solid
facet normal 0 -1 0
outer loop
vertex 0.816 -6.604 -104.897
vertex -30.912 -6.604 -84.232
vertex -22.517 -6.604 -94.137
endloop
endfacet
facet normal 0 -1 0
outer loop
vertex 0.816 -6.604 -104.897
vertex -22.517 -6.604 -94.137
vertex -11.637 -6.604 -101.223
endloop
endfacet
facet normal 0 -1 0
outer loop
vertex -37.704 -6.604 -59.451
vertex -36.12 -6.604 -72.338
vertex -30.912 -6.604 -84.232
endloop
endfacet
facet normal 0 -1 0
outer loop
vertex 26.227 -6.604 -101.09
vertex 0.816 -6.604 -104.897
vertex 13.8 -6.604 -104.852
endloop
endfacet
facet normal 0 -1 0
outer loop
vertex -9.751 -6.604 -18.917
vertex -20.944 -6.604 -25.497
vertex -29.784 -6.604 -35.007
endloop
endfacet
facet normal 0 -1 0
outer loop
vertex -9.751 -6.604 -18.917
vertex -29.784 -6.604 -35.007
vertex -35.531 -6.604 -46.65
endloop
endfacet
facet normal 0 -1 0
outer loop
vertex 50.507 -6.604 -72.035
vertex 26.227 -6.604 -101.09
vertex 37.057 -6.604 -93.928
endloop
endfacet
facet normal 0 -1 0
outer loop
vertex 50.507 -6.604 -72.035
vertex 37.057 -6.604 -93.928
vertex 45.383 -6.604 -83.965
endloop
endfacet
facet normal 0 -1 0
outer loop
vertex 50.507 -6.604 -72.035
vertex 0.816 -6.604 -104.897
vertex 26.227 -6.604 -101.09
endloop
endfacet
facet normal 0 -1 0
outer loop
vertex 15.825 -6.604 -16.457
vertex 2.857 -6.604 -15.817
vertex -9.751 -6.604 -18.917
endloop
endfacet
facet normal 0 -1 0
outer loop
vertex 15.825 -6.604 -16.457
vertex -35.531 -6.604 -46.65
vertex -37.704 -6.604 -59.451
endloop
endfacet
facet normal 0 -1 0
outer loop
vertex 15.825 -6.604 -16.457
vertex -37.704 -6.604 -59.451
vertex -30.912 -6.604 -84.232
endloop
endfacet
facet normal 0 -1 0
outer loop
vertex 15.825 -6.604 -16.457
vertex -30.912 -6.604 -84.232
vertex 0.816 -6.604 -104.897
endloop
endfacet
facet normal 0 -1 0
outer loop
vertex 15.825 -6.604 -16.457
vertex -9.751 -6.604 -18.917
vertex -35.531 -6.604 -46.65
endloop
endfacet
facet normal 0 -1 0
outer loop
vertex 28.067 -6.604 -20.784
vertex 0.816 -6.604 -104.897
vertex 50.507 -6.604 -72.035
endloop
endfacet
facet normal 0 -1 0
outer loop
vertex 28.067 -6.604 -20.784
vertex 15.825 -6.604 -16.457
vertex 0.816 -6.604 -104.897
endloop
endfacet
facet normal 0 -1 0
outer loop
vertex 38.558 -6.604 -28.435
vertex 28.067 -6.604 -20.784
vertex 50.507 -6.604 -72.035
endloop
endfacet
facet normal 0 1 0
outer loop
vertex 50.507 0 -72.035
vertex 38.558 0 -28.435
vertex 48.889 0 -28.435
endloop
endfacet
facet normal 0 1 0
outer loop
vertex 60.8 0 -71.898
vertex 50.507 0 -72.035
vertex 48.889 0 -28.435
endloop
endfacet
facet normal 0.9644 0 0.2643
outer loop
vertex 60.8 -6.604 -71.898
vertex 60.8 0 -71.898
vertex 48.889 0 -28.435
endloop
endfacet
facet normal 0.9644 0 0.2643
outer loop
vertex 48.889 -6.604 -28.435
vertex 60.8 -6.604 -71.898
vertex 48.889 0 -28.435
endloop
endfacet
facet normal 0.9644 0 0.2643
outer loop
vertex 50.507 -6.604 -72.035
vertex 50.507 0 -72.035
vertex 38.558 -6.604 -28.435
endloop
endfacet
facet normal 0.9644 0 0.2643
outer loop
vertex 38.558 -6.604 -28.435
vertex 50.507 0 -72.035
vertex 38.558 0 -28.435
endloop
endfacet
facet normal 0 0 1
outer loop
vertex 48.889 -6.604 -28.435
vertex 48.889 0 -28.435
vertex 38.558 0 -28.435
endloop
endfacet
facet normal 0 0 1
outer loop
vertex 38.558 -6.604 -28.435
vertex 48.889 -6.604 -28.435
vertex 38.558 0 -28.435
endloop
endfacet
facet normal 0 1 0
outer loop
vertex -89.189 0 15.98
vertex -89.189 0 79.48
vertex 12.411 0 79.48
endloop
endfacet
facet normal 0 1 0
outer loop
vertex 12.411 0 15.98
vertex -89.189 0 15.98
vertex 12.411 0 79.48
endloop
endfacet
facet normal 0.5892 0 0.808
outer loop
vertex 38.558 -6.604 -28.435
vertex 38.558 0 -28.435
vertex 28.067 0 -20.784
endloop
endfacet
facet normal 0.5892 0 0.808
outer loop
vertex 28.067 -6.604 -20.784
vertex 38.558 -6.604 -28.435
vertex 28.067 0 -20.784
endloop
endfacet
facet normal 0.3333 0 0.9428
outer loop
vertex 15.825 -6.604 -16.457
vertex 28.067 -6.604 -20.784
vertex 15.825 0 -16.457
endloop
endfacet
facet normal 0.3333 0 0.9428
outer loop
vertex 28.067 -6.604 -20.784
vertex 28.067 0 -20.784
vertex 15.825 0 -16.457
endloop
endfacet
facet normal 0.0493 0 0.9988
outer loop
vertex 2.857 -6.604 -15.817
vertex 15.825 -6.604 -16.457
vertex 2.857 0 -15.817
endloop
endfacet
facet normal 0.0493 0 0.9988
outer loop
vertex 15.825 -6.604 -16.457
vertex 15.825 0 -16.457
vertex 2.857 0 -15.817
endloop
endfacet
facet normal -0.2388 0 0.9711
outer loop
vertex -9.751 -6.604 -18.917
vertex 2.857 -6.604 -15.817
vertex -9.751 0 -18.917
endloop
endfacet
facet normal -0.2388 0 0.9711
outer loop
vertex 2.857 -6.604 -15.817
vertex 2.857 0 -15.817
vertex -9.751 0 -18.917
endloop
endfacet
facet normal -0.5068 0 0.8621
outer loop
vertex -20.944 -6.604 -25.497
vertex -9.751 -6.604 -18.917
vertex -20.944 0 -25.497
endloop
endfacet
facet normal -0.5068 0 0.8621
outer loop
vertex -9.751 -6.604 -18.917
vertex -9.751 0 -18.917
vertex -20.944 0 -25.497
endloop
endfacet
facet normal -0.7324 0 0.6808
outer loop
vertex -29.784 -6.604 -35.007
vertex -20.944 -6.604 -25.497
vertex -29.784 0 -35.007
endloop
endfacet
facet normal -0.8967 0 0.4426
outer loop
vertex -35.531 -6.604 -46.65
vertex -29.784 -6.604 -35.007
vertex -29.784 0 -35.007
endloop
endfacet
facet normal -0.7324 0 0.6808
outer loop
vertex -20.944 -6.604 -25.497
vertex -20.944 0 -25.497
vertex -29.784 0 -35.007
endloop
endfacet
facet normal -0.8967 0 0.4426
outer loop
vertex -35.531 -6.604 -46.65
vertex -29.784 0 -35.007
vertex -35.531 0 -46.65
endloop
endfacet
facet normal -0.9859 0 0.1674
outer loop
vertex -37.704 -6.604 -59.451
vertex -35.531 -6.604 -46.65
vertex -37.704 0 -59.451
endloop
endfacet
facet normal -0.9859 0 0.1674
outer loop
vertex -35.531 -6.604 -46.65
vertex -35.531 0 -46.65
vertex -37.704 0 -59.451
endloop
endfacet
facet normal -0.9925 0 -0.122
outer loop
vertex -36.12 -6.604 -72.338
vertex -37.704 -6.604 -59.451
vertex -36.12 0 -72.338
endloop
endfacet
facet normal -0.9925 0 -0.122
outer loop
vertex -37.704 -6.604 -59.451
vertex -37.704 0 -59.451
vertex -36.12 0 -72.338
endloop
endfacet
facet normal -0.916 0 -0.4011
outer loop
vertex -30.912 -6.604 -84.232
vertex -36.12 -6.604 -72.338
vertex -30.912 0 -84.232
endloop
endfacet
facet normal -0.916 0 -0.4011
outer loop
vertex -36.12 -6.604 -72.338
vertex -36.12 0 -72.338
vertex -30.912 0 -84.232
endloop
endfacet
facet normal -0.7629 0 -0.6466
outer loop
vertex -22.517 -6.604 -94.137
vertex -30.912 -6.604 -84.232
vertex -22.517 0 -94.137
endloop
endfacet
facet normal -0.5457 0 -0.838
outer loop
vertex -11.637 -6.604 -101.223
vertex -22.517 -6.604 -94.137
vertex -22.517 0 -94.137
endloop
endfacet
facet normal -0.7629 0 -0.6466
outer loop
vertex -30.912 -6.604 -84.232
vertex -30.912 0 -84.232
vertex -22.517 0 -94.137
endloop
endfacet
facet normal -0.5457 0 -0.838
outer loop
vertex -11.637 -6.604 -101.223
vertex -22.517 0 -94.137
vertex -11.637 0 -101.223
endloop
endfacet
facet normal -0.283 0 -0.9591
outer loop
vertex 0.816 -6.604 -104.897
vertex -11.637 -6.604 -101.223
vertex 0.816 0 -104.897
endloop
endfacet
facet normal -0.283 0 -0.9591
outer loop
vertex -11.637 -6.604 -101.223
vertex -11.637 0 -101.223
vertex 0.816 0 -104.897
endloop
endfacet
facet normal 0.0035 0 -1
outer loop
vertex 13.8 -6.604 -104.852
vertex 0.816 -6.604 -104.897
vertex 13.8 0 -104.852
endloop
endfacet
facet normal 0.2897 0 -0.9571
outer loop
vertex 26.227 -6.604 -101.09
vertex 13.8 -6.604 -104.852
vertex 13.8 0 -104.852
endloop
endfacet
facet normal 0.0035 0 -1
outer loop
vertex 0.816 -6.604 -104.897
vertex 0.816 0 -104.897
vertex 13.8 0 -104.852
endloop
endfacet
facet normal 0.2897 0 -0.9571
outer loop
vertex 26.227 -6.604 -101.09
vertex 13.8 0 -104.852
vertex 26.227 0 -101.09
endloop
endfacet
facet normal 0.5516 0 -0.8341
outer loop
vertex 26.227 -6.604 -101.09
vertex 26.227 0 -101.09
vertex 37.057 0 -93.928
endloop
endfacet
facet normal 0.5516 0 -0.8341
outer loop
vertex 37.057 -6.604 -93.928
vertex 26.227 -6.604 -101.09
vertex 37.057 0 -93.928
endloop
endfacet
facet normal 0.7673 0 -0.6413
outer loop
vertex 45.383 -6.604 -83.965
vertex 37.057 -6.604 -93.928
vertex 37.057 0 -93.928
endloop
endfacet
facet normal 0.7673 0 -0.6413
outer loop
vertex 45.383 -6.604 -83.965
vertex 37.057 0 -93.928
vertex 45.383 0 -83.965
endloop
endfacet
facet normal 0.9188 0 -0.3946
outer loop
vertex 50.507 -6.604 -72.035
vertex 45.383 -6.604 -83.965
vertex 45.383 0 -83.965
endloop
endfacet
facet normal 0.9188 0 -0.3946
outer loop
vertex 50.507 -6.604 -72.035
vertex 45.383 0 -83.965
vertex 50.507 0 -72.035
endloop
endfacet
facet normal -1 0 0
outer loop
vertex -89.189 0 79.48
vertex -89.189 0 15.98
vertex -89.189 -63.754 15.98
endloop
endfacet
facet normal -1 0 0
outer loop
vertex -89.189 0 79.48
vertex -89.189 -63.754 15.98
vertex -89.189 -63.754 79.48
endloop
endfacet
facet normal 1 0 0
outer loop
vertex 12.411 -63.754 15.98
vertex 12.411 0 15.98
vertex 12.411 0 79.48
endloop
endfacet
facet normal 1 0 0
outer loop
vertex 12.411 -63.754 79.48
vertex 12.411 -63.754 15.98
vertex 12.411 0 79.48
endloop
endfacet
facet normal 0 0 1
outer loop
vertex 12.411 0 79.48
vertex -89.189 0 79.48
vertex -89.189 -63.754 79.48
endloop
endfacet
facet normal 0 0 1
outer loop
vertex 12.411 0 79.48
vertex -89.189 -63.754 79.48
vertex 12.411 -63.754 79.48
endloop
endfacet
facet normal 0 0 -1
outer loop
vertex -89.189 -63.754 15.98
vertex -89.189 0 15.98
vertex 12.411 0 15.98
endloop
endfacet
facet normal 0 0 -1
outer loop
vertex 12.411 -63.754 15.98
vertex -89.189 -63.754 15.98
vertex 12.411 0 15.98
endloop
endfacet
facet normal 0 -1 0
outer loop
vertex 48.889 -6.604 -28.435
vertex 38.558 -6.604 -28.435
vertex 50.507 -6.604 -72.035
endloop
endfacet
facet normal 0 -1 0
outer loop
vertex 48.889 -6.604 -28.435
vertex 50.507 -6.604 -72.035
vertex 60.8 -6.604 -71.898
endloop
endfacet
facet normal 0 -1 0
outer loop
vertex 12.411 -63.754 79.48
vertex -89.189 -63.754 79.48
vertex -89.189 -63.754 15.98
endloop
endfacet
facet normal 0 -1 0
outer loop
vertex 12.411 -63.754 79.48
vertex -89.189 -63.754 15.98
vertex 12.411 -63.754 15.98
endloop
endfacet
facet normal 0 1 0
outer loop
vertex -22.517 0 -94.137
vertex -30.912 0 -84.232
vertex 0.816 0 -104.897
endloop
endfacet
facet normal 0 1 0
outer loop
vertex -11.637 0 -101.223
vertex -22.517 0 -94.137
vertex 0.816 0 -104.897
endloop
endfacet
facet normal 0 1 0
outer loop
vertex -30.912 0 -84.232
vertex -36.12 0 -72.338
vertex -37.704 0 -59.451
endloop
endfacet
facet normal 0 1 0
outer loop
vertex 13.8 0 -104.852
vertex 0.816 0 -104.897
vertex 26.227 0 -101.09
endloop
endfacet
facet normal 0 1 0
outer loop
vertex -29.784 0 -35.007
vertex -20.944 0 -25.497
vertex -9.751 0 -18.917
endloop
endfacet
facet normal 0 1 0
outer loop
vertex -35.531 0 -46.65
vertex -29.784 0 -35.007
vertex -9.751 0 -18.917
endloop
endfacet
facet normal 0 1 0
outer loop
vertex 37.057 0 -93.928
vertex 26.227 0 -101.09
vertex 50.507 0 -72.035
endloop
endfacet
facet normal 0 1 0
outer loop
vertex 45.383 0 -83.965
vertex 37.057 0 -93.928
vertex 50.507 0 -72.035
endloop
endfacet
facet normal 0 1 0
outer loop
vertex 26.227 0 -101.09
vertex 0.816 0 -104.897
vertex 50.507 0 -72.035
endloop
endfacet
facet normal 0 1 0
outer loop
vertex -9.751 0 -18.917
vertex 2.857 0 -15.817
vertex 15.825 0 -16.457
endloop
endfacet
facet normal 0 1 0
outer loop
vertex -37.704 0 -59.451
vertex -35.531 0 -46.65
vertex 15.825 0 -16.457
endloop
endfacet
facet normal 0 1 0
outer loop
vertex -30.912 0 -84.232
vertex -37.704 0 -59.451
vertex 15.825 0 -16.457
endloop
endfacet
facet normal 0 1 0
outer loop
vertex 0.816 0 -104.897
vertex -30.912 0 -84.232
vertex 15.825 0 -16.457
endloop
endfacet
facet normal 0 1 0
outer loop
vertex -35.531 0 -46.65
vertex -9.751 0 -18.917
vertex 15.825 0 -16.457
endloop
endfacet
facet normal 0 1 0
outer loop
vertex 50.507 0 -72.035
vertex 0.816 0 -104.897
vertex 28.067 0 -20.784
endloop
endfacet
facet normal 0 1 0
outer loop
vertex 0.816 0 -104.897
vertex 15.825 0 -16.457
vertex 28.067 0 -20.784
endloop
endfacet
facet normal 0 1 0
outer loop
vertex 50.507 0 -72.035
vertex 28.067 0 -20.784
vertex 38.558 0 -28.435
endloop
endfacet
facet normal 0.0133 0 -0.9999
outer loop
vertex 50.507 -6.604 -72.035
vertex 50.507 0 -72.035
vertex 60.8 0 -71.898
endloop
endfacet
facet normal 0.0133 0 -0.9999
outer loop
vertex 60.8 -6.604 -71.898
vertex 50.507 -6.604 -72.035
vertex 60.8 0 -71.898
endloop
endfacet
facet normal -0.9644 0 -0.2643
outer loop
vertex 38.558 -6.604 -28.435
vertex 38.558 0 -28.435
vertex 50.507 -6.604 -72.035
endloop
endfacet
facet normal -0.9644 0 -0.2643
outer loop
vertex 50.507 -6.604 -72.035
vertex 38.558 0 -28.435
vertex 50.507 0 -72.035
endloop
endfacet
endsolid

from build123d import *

# Parameters (mm, degrees)
F0_W     = 101.6
F0_H     = 63.5
F1_DEPTH = 63.754
F2_DEPTH = 6.604
F3_DEPTH = 6.604


with BuildPart() as f1:
    # F0 (on Front) → F1 (new body)
    with BuildSketch(Plane.XZ):
        with Locations((-38.389131, 47.730444)):
            Rectangle(F0_W, F0_H)
    extrude(amount=F1_DEPTH)


with BuildPart() as f2:
    # F0 (on Front) → F2 (new body)
    with BuildSketch(Plane.XZ):
        with BuildLine():
            Line((50.506752, -72.034515), (38.557757, -28.434701))
            ThreePointArc((38.557757, -28.434701), (-36.119708, -72.338141), (50.506752, -72.034515))
        make_face()
    extrude(amount=F2_DEPTH)


with BuildPart() as f3:
    # F0 (on Front) → F3 (new body)
    with BuildSketch(Plane.XZ):
        Polygon((48.888706, -28.434701), (38.557757, -28.434701), (50.506752, -72.034515), (60.800345, -71.898211), align=None)
    extrude(amount=F3_DEPTH)


solid = Compound([f1.part, f2.part, f3.part])
